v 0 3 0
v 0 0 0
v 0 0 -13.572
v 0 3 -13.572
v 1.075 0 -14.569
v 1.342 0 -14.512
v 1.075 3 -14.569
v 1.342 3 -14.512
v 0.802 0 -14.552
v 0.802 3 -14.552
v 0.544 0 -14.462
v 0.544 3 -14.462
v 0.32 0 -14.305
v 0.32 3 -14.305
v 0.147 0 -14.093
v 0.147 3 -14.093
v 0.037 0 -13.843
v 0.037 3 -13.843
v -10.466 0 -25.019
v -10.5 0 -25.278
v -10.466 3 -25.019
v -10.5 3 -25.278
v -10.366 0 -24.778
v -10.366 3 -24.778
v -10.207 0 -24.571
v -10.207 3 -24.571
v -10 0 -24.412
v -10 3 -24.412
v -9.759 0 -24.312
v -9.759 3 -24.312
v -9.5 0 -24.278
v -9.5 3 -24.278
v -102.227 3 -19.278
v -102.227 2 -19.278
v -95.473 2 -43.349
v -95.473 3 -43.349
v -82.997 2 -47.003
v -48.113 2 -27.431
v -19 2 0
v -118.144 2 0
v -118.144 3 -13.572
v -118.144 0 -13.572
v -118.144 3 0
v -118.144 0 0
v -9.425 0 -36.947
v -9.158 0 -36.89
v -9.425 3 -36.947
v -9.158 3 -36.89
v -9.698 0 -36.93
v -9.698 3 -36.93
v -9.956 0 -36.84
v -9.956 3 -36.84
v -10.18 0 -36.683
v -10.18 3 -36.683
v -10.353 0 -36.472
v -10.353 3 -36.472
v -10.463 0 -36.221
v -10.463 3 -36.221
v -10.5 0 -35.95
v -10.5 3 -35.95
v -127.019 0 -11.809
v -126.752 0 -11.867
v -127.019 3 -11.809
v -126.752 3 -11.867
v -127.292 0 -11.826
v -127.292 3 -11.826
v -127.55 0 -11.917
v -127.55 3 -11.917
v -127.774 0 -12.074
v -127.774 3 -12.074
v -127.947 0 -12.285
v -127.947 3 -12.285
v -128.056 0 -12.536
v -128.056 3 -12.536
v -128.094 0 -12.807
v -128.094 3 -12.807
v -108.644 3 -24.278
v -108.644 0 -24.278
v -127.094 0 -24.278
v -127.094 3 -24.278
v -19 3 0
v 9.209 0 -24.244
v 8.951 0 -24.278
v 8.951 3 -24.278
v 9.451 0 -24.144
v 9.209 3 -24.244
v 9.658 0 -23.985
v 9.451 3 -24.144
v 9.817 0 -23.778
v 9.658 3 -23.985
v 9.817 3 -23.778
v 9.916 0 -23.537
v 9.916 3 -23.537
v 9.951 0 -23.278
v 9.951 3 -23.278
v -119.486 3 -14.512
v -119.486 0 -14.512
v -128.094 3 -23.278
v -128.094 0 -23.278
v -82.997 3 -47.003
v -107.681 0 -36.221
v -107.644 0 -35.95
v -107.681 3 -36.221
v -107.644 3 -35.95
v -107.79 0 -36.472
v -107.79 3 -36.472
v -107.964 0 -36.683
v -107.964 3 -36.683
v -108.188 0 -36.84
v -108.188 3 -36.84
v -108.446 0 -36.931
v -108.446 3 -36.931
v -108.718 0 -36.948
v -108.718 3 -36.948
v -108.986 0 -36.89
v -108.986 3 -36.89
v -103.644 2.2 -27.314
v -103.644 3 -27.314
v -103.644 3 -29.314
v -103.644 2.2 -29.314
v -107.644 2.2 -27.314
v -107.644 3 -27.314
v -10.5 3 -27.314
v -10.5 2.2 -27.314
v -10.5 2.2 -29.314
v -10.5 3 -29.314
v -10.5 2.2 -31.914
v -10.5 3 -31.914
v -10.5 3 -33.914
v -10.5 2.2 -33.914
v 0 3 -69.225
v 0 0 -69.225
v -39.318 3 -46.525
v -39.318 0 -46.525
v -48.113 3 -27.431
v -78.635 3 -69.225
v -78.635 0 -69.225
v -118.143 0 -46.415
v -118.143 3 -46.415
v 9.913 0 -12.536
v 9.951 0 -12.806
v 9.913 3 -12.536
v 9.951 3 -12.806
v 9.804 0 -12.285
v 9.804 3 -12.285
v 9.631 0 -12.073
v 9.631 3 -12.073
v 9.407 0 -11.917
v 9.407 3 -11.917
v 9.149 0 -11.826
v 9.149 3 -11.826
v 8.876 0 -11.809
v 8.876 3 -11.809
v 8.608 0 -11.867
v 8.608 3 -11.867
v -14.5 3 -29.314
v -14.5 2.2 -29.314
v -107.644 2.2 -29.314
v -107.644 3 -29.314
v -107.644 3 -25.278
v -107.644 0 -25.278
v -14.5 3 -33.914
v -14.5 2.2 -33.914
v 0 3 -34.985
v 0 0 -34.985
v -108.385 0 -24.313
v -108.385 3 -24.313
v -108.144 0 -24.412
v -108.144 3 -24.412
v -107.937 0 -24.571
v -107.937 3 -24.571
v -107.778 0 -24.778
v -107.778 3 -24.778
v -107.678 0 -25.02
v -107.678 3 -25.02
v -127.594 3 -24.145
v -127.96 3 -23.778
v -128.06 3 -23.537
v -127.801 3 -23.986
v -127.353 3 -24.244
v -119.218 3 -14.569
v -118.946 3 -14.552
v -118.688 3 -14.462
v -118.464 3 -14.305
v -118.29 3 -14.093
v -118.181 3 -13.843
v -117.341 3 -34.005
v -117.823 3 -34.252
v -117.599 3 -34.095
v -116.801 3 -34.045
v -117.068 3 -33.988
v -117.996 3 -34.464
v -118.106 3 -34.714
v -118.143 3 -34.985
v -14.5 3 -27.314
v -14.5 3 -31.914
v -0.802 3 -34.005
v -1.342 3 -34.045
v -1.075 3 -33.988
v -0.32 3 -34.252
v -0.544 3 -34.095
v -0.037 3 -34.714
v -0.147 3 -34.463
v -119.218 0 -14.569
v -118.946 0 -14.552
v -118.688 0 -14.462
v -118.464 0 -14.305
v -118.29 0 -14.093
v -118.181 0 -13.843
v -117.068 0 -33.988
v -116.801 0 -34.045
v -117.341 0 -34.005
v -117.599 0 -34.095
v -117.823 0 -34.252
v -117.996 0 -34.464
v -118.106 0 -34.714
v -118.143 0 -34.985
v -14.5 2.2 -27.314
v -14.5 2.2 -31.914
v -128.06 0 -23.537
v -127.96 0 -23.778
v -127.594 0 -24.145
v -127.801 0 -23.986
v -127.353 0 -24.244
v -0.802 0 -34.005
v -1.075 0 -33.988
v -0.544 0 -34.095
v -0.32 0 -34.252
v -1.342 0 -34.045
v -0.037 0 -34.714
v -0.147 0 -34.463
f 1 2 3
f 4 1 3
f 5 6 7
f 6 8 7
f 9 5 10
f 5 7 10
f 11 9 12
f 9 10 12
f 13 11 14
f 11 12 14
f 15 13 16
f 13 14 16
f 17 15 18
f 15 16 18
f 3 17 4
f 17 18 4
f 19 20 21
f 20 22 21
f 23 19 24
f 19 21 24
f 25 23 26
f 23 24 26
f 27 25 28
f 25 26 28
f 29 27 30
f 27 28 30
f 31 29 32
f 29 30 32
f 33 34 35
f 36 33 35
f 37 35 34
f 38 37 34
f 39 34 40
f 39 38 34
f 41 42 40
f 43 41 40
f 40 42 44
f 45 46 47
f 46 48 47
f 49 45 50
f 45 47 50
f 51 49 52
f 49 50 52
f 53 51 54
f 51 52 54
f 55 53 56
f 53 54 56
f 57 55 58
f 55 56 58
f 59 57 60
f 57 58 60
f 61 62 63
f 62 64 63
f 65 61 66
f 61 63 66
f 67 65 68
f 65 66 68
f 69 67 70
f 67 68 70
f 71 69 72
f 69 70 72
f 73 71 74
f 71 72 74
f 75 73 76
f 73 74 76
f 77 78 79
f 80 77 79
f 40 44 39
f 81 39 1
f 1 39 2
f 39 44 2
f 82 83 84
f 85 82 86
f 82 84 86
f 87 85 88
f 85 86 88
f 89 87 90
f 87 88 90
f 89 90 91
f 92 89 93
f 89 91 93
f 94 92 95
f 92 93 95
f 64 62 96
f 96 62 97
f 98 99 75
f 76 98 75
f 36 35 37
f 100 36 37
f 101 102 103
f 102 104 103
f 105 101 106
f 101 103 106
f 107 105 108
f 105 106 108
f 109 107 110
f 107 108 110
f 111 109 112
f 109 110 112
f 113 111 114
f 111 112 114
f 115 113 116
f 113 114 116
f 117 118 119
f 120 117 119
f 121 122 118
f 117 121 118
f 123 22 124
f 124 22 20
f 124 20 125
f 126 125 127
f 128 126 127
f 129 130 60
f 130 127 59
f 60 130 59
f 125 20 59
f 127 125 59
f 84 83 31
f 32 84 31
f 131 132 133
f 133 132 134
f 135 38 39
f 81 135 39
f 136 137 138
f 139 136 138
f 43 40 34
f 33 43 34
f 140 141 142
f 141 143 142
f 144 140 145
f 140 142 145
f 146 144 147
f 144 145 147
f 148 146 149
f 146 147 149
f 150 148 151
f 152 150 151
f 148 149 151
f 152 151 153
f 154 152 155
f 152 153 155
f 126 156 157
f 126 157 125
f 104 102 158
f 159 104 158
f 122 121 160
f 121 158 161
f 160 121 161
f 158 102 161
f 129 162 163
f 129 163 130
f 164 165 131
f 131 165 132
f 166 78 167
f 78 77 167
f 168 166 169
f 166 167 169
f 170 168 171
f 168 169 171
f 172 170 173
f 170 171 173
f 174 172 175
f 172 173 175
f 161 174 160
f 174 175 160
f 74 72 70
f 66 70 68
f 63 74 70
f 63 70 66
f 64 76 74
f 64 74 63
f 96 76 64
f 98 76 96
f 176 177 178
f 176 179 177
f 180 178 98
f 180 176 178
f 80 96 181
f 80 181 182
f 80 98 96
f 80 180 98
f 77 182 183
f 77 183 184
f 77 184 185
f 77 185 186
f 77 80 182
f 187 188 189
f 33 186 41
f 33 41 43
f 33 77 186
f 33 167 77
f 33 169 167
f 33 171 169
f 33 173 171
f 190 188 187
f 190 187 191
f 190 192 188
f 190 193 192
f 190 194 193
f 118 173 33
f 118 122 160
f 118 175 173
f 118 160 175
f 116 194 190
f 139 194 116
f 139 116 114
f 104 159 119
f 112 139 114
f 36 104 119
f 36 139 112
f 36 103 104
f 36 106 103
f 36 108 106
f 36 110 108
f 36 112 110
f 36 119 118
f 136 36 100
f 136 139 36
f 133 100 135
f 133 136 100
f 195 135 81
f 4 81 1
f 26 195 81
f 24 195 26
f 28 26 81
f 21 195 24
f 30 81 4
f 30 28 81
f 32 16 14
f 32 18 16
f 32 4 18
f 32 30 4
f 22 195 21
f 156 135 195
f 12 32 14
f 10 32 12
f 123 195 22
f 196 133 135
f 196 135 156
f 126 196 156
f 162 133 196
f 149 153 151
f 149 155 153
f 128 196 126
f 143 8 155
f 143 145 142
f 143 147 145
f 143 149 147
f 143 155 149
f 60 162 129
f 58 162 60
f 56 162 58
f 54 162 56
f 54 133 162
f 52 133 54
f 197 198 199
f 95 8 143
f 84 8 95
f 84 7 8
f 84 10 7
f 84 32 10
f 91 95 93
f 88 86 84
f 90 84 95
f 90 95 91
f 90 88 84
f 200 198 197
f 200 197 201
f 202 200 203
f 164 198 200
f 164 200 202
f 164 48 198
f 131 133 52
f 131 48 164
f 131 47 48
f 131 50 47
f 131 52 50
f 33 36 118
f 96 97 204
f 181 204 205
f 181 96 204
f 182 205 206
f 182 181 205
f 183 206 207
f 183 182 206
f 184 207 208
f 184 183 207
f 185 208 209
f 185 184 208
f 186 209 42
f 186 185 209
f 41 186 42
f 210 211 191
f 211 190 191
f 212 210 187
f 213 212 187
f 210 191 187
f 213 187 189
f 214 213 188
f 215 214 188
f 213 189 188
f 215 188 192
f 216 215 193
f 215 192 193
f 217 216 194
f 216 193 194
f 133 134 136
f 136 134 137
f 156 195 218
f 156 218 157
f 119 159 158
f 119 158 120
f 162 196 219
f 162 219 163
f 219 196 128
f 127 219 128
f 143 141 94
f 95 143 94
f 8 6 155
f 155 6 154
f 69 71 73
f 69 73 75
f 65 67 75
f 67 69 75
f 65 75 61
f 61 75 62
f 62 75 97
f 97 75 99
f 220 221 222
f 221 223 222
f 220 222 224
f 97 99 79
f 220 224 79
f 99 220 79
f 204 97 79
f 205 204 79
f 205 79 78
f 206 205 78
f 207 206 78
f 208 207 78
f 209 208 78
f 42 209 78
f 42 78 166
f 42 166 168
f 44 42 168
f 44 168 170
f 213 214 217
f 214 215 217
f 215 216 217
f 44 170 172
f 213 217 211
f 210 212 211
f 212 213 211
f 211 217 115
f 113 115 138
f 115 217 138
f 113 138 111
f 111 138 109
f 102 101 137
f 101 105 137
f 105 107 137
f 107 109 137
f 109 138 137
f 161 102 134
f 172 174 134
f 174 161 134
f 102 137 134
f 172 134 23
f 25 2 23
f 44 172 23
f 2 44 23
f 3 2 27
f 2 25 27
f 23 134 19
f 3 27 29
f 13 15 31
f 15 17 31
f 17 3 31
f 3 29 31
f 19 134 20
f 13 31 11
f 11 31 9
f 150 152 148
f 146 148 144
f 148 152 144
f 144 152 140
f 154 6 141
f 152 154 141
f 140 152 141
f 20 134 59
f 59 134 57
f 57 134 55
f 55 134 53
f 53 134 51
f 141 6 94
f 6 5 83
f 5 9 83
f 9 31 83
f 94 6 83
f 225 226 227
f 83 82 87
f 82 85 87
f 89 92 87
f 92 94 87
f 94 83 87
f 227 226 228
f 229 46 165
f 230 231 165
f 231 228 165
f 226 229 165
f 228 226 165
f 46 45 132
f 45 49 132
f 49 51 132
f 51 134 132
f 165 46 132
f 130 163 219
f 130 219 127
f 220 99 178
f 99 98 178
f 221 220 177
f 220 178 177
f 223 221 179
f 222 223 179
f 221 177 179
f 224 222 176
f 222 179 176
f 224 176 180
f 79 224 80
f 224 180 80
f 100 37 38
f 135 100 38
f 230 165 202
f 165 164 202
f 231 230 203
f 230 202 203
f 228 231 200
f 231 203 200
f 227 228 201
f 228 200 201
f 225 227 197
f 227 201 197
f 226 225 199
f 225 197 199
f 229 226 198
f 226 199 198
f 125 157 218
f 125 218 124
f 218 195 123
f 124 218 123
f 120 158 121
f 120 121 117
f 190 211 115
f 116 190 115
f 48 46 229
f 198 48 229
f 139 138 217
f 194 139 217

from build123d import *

# Parameters (mm, degrees)
P_IDAT_VYSUNUT_M1_DEPTH  = 3
P_IDAT_VYSUNUT_M2_DEPTH  = 2
ZAOBLIT3_R               = 1
SKICA2_W                 = 4
SKICA2_H                 = 2
ODEBRAT_VYSUNUT_M1_DEPTH = 0.8
SKICA3_W                 = 4
SKICA3_H                 = 2
ODEBRAT_VYSUNUT_M2_DEPTH = 0.8


with BuildPart() as part:
    # Skica1 → P_idat vysunut_m1 (new body)
    with BuildSketch(Plane(origin=(0, 0, 0), x_dir=(1, 0, 0), z_dir=(0, 1, 0))):
        Polygon((-118.143750166, 15), (-118.143750166, 0), (-102.227105248, 19.278496169), (-95.473037065, 43.348863075), (-82.997228437, 47.003202833), (-48.112980408, 27.430537213), (-19, 0), (0, 0), (0, 15), (9.950504516, 11.37831254), (9.950504516, 24.27831254), (-10.5, 24.27831254), (-10.5, 37.37831254), (0, 33.55662508), (0, 69.224902673), (-39.317553332, 46.524902673), (-78.635106664, 69.224902673), (-118.143185584, 46.414902673), (-118.143185584, 33.5570142), (-107.643750166, 37.378496169), (-107.643750166, 24.278496169), (-128.093750166, 24.278496169), (-128.093750166, 11.378496169), align=None)
    extrude(amount=P_IDAT_VYSUNUT_M1_DEPTH)

    # Skica1_3 → P_idat vysunut_m2 (add)
    with BuildSketch(Plane(origin=(0, 0, 0), x_dir=(1, 0, 0), z_dir=(0, 1, 0))):
        Polygon((-102.227105248, 19.278496169), (-118.143750166, 0), (-19, 0), (-48.112980408, 27.430537213), (-82.997228437, 47.003202833), (-95.473037065, 43.348863075), align=None)
    extrude(amount=P_IDAT_VYSUNUT_M2_DEPTH)

    # Zaoblit3
    zaoblit3_edges = [part.edges().sort_by_distance(p)[0] for p in [
        (-10.5, 1.5, -24.27831254),
        (9.950504516, 1.5, -24.27831254),
        (9.950504516, 1.5, -11.37831254),
        (0, 1.5, -15),
        (-118.143750166, 1.5, -15),
        (-128.093750166, 1.5, -11.378496169),
        (-128.093750166, 1.5, -24.278496169),
        (-107.643750166, 1.5, -24.278496169),
        (-107.643750166, 1.5, -37.378496169),
        (-118.143185584, 1.5, -33.5570142),
        (0, 1.5, -33.55662508),
        (-10.5, 1.5, -37.37831254),
    ]]
    fillet(zaoblit3_edges, radius=ZAOBLIT3_R)

    # Skica2 → Odebrat vysunut_m1 (cut)
    with BuildSketch(Plane(origin=(0, 3, 0), x_dir=(1, 0, 0), z_dir=(0, 1, 0))):
        with Locations((-105.643750166, 28.314422166)):
            Rectangle(SKICA2_W, SKICA2_H)
    extrude(amount=-ODEBRAT_VYSUNUT_M1_DEPTH, mode=Mode.SUBTRACT)

    # Skica3 → Odebrat vysunut_m2 (cut)
    with BuildSketch(Plane(origin=(0, 3, 0), x_dir=(1, 0, 0), z_dir=(0, 1, 0))):
        with Locations((-12.5, 32.914238537)):
            Rectangle(SKICA3_W, SKICA3_H)
        with Locations((-12.5, 28.314238537)):
            Rectangle(SKICA3_W, SKICA3_H)
    extrude(amount=-ODEBRAT_VYSUNUT_M2_DEPTH, mode=Mode.SUBTRACT)


solid = part.part
